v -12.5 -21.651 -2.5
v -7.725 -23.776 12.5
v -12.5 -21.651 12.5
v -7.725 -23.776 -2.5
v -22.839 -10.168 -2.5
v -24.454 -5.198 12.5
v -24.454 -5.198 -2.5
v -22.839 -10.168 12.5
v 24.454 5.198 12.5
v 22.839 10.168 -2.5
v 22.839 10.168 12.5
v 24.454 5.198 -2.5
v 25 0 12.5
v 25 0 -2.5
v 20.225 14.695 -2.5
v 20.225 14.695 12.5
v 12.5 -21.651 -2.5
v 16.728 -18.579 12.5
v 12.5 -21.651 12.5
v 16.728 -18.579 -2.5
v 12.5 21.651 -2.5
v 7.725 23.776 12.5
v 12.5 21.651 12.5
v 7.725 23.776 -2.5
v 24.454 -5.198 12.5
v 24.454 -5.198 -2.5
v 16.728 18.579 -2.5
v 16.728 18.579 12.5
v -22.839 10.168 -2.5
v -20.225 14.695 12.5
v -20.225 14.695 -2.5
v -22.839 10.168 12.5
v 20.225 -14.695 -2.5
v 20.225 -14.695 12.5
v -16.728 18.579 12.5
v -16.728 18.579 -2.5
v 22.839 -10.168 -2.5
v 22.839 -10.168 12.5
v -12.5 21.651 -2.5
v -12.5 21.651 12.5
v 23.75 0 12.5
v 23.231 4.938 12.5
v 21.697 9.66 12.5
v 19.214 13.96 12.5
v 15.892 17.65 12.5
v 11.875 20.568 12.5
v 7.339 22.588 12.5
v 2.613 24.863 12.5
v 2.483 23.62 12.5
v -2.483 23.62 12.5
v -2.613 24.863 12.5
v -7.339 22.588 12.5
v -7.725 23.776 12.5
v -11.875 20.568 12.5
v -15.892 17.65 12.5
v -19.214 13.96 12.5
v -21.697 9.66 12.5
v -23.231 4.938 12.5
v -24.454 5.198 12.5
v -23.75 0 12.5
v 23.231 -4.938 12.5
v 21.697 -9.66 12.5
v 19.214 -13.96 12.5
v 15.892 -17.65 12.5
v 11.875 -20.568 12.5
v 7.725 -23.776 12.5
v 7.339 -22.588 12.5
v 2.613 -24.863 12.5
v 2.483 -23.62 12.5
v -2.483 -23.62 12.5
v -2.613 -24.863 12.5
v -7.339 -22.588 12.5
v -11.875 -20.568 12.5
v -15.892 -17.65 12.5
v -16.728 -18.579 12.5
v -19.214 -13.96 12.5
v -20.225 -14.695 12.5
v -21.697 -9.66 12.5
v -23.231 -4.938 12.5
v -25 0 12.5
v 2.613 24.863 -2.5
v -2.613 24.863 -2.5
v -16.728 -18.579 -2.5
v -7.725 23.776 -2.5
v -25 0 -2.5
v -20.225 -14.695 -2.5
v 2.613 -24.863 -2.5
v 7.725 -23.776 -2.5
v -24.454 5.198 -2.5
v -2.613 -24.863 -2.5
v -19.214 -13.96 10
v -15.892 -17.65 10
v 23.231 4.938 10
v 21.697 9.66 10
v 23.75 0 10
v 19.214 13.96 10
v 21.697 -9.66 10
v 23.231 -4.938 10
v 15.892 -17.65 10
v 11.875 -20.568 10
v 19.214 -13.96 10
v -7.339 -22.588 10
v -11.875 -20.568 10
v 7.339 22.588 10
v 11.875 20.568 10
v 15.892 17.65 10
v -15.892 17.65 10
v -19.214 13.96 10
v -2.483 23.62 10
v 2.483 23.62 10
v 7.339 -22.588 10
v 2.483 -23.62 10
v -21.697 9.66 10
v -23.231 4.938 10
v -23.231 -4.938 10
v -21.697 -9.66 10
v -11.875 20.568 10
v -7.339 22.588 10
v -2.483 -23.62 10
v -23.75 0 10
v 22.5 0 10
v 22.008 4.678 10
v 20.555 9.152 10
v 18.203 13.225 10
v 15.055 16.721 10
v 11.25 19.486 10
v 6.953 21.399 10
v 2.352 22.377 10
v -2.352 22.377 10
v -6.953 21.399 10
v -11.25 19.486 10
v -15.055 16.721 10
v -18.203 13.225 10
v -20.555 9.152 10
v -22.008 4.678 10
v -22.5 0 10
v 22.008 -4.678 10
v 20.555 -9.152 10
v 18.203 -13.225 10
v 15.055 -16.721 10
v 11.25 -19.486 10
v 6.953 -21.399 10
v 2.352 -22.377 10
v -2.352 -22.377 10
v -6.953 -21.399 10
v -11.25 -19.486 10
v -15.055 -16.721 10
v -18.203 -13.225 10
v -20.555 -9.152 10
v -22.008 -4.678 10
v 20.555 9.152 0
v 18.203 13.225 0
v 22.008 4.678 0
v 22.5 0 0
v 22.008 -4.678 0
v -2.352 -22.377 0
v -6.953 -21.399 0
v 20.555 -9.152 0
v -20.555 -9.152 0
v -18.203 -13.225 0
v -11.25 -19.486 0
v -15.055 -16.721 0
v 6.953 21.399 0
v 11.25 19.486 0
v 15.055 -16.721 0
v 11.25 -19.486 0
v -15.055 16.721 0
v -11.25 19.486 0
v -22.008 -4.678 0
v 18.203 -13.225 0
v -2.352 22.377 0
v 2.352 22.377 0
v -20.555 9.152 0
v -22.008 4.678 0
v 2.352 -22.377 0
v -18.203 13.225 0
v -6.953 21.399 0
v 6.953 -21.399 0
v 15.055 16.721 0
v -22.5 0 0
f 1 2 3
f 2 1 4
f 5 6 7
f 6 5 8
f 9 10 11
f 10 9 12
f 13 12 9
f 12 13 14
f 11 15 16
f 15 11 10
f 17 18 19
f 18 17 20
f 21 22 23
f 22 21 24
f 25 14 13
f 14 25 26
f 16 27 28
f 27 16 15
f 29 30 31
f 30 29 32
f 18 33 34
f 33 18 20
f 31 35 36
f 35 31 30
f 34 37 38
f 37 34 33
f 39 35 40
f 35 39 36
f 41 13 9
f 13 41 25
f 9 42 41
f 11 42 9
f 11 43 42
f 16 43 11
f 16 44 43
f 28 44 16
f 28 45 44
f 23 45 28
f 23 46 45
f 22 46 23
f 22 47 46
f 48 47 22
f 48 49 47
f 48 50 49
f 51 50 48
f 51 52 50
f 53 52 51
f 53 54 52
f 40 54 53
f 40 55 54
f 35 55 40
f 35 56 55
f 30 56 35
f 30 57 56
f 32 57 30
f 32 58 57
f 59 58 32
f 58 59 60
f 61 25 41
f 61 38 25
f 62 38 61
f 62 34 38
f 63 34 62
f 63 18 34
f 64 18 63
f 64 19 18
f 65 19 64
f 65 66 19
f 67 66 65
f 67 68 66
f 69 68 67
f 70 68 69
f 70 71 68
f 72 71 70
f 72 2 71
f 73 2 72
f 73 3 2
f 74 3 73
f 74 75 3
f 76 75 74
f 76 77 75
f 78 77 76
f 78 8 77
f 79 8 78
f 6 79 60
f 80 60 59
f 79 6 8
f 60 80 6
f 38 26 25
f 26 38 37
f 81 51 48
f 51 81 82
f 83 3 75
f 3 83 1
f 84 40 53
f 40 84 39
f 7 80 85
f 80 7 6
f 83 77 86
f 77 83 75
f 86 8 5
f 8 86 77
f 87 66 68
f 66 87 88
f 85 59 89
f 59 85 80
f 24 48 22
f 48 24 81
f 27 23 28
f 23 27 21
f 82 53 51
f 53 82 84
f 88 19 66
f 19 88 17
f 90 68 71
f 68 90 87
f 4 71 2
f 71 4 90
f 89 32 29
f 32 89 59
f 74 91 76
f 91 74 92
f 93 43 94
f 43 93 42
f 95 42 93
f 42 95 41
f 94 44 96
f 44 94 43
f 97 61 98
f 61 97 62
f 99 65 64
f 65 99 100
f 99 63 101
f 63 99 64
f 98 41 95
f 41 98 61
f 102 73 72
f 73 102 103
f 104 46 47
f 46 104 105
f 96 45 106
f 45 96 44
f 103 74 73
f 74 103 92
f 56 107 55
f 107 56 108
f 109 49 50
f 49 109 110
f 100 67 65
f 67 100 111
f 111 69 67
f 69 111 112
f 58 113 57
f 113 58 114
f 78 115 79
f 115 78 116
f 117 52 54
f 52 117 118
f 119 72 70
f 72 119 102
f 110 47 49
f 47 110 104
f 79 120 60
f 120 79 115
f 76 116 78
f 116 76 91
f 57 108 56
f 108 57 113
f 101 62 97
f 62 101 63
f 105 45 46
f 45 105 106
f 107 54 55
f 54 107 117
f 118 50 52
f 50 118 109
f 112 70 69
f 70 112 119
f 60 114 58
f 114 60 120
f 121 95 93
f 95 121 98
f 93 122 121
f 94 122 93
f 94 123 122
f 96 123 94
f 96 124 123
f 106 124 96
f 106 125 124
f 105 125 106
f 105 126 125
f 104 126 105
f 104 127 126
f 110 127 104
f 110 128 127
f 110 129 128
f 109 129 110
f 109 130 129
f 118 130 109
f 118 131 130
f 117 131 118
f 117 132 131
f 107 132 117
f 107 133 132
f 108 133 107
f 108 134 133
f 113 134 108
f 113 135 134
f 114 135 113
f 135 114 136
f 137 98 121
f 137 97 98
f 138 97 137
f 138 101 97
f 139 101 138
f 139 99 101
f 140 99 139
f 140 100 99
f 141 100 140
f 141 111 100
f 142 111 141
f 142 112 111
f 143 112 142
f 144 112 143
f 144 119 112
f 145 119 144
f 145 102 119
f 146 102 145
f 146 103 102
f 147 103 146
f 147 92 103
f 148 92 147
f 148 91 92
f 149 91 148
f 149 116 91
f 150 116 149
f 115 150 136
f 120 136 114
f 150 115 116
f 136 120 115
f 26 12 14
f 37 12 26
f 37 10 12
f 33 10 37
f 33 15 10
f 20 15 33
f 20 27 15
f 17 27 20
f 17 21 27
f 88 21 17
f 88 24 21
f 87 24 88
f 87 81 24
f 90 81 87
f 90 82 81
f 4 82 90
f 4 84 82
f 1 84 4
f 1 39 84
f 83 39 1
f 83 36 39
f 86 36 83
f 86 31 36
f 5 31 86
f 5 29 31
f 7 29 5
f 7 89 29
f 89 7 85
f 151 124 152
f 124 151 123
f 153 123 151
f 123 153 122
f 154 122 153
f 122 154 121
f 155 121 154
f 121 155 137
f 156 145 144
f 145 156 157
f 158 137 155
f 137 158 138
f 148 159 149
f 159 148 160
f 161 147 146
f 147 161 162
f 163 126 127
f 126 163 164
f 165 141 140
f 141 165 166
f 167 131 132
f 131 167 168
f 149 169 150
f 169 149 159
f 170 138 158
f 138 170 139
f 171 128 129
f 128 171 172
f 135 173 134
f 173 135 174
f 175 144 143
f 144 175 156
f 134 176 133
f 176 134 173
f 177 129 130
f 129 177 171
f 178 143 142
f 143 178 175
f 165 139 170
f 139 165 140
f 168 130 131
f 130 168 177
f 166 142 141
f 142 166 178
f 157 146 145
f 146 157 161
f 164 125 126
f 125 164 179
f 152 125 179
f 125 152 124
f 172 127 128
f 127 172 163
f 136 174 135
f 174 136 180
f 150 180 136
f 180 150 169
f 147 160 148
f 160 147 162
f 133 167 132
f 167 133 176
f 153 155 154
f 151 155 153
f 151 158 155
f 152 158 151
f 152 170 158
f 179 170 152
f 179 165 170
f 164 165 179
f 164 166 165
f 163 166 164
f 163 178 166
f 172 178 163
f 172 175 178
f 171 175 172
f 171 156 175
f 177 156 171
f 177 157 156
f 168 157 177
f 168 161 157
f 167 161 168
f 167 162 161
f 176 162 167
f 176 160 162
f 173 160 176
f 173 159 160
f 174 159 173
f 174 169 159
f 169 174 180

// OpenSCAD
height_picture = 3; // [1:5]
  
Cylinder_radius= 50+0;

Cup_Radius=22.5;//in mm

Top_Minimum_Thickness=2.5;
Wall_Thickness=2.5;
Wall_Height=10;
Rc=Cup_Radius+Wall_Thickness;
Base_Incut=1.25;
Base_Thickness=2.5;
Base_Radius=Cup_Radius+Base_Incut;


// Load a 100x100 pixel image. (images will be automatically stretched to fit) Simple, high contrast images like logos work best.
image_file = "image-surface.dat"; // [image_surface:100x100] 
 
union (){

difference(){
cylinder(Wall_Height+Base_Thickness,Rc,Rc);
translate([0,0,-1])cylinder(Wall_Height+2+Base_Thickness,Base_Radius,Base_Radius);
}

difference(){
translate([0,0,-Top_Minimum_Thickness])cylinder(Wall_Height+Top_Minimum_Thickness,Rc,Rc);
translate([0,0,-1-Top_Minimum_Thickness])cylinder(Wall_Height+2+Top_Minimum_Thickness,Cup_Radius,Cup_Radius);
}

translate([0,0,0-Top_Minimum_Thickness])cylinder(Top_Minimum_Thickness,Rc,Rc);

scale([Cup_Radius/50,Cup_Radius/50,1]) intersection(){
translate([0,0,0-Top_Minimum_Thickness])cylinder(height_picture+Top_Minimum_Thickness+1,Cylinder_radius,Cylinder_radius);

scale([1,1,height_picture]) surface(file=image_file, center=true, convexity=5);
//};

}

}
